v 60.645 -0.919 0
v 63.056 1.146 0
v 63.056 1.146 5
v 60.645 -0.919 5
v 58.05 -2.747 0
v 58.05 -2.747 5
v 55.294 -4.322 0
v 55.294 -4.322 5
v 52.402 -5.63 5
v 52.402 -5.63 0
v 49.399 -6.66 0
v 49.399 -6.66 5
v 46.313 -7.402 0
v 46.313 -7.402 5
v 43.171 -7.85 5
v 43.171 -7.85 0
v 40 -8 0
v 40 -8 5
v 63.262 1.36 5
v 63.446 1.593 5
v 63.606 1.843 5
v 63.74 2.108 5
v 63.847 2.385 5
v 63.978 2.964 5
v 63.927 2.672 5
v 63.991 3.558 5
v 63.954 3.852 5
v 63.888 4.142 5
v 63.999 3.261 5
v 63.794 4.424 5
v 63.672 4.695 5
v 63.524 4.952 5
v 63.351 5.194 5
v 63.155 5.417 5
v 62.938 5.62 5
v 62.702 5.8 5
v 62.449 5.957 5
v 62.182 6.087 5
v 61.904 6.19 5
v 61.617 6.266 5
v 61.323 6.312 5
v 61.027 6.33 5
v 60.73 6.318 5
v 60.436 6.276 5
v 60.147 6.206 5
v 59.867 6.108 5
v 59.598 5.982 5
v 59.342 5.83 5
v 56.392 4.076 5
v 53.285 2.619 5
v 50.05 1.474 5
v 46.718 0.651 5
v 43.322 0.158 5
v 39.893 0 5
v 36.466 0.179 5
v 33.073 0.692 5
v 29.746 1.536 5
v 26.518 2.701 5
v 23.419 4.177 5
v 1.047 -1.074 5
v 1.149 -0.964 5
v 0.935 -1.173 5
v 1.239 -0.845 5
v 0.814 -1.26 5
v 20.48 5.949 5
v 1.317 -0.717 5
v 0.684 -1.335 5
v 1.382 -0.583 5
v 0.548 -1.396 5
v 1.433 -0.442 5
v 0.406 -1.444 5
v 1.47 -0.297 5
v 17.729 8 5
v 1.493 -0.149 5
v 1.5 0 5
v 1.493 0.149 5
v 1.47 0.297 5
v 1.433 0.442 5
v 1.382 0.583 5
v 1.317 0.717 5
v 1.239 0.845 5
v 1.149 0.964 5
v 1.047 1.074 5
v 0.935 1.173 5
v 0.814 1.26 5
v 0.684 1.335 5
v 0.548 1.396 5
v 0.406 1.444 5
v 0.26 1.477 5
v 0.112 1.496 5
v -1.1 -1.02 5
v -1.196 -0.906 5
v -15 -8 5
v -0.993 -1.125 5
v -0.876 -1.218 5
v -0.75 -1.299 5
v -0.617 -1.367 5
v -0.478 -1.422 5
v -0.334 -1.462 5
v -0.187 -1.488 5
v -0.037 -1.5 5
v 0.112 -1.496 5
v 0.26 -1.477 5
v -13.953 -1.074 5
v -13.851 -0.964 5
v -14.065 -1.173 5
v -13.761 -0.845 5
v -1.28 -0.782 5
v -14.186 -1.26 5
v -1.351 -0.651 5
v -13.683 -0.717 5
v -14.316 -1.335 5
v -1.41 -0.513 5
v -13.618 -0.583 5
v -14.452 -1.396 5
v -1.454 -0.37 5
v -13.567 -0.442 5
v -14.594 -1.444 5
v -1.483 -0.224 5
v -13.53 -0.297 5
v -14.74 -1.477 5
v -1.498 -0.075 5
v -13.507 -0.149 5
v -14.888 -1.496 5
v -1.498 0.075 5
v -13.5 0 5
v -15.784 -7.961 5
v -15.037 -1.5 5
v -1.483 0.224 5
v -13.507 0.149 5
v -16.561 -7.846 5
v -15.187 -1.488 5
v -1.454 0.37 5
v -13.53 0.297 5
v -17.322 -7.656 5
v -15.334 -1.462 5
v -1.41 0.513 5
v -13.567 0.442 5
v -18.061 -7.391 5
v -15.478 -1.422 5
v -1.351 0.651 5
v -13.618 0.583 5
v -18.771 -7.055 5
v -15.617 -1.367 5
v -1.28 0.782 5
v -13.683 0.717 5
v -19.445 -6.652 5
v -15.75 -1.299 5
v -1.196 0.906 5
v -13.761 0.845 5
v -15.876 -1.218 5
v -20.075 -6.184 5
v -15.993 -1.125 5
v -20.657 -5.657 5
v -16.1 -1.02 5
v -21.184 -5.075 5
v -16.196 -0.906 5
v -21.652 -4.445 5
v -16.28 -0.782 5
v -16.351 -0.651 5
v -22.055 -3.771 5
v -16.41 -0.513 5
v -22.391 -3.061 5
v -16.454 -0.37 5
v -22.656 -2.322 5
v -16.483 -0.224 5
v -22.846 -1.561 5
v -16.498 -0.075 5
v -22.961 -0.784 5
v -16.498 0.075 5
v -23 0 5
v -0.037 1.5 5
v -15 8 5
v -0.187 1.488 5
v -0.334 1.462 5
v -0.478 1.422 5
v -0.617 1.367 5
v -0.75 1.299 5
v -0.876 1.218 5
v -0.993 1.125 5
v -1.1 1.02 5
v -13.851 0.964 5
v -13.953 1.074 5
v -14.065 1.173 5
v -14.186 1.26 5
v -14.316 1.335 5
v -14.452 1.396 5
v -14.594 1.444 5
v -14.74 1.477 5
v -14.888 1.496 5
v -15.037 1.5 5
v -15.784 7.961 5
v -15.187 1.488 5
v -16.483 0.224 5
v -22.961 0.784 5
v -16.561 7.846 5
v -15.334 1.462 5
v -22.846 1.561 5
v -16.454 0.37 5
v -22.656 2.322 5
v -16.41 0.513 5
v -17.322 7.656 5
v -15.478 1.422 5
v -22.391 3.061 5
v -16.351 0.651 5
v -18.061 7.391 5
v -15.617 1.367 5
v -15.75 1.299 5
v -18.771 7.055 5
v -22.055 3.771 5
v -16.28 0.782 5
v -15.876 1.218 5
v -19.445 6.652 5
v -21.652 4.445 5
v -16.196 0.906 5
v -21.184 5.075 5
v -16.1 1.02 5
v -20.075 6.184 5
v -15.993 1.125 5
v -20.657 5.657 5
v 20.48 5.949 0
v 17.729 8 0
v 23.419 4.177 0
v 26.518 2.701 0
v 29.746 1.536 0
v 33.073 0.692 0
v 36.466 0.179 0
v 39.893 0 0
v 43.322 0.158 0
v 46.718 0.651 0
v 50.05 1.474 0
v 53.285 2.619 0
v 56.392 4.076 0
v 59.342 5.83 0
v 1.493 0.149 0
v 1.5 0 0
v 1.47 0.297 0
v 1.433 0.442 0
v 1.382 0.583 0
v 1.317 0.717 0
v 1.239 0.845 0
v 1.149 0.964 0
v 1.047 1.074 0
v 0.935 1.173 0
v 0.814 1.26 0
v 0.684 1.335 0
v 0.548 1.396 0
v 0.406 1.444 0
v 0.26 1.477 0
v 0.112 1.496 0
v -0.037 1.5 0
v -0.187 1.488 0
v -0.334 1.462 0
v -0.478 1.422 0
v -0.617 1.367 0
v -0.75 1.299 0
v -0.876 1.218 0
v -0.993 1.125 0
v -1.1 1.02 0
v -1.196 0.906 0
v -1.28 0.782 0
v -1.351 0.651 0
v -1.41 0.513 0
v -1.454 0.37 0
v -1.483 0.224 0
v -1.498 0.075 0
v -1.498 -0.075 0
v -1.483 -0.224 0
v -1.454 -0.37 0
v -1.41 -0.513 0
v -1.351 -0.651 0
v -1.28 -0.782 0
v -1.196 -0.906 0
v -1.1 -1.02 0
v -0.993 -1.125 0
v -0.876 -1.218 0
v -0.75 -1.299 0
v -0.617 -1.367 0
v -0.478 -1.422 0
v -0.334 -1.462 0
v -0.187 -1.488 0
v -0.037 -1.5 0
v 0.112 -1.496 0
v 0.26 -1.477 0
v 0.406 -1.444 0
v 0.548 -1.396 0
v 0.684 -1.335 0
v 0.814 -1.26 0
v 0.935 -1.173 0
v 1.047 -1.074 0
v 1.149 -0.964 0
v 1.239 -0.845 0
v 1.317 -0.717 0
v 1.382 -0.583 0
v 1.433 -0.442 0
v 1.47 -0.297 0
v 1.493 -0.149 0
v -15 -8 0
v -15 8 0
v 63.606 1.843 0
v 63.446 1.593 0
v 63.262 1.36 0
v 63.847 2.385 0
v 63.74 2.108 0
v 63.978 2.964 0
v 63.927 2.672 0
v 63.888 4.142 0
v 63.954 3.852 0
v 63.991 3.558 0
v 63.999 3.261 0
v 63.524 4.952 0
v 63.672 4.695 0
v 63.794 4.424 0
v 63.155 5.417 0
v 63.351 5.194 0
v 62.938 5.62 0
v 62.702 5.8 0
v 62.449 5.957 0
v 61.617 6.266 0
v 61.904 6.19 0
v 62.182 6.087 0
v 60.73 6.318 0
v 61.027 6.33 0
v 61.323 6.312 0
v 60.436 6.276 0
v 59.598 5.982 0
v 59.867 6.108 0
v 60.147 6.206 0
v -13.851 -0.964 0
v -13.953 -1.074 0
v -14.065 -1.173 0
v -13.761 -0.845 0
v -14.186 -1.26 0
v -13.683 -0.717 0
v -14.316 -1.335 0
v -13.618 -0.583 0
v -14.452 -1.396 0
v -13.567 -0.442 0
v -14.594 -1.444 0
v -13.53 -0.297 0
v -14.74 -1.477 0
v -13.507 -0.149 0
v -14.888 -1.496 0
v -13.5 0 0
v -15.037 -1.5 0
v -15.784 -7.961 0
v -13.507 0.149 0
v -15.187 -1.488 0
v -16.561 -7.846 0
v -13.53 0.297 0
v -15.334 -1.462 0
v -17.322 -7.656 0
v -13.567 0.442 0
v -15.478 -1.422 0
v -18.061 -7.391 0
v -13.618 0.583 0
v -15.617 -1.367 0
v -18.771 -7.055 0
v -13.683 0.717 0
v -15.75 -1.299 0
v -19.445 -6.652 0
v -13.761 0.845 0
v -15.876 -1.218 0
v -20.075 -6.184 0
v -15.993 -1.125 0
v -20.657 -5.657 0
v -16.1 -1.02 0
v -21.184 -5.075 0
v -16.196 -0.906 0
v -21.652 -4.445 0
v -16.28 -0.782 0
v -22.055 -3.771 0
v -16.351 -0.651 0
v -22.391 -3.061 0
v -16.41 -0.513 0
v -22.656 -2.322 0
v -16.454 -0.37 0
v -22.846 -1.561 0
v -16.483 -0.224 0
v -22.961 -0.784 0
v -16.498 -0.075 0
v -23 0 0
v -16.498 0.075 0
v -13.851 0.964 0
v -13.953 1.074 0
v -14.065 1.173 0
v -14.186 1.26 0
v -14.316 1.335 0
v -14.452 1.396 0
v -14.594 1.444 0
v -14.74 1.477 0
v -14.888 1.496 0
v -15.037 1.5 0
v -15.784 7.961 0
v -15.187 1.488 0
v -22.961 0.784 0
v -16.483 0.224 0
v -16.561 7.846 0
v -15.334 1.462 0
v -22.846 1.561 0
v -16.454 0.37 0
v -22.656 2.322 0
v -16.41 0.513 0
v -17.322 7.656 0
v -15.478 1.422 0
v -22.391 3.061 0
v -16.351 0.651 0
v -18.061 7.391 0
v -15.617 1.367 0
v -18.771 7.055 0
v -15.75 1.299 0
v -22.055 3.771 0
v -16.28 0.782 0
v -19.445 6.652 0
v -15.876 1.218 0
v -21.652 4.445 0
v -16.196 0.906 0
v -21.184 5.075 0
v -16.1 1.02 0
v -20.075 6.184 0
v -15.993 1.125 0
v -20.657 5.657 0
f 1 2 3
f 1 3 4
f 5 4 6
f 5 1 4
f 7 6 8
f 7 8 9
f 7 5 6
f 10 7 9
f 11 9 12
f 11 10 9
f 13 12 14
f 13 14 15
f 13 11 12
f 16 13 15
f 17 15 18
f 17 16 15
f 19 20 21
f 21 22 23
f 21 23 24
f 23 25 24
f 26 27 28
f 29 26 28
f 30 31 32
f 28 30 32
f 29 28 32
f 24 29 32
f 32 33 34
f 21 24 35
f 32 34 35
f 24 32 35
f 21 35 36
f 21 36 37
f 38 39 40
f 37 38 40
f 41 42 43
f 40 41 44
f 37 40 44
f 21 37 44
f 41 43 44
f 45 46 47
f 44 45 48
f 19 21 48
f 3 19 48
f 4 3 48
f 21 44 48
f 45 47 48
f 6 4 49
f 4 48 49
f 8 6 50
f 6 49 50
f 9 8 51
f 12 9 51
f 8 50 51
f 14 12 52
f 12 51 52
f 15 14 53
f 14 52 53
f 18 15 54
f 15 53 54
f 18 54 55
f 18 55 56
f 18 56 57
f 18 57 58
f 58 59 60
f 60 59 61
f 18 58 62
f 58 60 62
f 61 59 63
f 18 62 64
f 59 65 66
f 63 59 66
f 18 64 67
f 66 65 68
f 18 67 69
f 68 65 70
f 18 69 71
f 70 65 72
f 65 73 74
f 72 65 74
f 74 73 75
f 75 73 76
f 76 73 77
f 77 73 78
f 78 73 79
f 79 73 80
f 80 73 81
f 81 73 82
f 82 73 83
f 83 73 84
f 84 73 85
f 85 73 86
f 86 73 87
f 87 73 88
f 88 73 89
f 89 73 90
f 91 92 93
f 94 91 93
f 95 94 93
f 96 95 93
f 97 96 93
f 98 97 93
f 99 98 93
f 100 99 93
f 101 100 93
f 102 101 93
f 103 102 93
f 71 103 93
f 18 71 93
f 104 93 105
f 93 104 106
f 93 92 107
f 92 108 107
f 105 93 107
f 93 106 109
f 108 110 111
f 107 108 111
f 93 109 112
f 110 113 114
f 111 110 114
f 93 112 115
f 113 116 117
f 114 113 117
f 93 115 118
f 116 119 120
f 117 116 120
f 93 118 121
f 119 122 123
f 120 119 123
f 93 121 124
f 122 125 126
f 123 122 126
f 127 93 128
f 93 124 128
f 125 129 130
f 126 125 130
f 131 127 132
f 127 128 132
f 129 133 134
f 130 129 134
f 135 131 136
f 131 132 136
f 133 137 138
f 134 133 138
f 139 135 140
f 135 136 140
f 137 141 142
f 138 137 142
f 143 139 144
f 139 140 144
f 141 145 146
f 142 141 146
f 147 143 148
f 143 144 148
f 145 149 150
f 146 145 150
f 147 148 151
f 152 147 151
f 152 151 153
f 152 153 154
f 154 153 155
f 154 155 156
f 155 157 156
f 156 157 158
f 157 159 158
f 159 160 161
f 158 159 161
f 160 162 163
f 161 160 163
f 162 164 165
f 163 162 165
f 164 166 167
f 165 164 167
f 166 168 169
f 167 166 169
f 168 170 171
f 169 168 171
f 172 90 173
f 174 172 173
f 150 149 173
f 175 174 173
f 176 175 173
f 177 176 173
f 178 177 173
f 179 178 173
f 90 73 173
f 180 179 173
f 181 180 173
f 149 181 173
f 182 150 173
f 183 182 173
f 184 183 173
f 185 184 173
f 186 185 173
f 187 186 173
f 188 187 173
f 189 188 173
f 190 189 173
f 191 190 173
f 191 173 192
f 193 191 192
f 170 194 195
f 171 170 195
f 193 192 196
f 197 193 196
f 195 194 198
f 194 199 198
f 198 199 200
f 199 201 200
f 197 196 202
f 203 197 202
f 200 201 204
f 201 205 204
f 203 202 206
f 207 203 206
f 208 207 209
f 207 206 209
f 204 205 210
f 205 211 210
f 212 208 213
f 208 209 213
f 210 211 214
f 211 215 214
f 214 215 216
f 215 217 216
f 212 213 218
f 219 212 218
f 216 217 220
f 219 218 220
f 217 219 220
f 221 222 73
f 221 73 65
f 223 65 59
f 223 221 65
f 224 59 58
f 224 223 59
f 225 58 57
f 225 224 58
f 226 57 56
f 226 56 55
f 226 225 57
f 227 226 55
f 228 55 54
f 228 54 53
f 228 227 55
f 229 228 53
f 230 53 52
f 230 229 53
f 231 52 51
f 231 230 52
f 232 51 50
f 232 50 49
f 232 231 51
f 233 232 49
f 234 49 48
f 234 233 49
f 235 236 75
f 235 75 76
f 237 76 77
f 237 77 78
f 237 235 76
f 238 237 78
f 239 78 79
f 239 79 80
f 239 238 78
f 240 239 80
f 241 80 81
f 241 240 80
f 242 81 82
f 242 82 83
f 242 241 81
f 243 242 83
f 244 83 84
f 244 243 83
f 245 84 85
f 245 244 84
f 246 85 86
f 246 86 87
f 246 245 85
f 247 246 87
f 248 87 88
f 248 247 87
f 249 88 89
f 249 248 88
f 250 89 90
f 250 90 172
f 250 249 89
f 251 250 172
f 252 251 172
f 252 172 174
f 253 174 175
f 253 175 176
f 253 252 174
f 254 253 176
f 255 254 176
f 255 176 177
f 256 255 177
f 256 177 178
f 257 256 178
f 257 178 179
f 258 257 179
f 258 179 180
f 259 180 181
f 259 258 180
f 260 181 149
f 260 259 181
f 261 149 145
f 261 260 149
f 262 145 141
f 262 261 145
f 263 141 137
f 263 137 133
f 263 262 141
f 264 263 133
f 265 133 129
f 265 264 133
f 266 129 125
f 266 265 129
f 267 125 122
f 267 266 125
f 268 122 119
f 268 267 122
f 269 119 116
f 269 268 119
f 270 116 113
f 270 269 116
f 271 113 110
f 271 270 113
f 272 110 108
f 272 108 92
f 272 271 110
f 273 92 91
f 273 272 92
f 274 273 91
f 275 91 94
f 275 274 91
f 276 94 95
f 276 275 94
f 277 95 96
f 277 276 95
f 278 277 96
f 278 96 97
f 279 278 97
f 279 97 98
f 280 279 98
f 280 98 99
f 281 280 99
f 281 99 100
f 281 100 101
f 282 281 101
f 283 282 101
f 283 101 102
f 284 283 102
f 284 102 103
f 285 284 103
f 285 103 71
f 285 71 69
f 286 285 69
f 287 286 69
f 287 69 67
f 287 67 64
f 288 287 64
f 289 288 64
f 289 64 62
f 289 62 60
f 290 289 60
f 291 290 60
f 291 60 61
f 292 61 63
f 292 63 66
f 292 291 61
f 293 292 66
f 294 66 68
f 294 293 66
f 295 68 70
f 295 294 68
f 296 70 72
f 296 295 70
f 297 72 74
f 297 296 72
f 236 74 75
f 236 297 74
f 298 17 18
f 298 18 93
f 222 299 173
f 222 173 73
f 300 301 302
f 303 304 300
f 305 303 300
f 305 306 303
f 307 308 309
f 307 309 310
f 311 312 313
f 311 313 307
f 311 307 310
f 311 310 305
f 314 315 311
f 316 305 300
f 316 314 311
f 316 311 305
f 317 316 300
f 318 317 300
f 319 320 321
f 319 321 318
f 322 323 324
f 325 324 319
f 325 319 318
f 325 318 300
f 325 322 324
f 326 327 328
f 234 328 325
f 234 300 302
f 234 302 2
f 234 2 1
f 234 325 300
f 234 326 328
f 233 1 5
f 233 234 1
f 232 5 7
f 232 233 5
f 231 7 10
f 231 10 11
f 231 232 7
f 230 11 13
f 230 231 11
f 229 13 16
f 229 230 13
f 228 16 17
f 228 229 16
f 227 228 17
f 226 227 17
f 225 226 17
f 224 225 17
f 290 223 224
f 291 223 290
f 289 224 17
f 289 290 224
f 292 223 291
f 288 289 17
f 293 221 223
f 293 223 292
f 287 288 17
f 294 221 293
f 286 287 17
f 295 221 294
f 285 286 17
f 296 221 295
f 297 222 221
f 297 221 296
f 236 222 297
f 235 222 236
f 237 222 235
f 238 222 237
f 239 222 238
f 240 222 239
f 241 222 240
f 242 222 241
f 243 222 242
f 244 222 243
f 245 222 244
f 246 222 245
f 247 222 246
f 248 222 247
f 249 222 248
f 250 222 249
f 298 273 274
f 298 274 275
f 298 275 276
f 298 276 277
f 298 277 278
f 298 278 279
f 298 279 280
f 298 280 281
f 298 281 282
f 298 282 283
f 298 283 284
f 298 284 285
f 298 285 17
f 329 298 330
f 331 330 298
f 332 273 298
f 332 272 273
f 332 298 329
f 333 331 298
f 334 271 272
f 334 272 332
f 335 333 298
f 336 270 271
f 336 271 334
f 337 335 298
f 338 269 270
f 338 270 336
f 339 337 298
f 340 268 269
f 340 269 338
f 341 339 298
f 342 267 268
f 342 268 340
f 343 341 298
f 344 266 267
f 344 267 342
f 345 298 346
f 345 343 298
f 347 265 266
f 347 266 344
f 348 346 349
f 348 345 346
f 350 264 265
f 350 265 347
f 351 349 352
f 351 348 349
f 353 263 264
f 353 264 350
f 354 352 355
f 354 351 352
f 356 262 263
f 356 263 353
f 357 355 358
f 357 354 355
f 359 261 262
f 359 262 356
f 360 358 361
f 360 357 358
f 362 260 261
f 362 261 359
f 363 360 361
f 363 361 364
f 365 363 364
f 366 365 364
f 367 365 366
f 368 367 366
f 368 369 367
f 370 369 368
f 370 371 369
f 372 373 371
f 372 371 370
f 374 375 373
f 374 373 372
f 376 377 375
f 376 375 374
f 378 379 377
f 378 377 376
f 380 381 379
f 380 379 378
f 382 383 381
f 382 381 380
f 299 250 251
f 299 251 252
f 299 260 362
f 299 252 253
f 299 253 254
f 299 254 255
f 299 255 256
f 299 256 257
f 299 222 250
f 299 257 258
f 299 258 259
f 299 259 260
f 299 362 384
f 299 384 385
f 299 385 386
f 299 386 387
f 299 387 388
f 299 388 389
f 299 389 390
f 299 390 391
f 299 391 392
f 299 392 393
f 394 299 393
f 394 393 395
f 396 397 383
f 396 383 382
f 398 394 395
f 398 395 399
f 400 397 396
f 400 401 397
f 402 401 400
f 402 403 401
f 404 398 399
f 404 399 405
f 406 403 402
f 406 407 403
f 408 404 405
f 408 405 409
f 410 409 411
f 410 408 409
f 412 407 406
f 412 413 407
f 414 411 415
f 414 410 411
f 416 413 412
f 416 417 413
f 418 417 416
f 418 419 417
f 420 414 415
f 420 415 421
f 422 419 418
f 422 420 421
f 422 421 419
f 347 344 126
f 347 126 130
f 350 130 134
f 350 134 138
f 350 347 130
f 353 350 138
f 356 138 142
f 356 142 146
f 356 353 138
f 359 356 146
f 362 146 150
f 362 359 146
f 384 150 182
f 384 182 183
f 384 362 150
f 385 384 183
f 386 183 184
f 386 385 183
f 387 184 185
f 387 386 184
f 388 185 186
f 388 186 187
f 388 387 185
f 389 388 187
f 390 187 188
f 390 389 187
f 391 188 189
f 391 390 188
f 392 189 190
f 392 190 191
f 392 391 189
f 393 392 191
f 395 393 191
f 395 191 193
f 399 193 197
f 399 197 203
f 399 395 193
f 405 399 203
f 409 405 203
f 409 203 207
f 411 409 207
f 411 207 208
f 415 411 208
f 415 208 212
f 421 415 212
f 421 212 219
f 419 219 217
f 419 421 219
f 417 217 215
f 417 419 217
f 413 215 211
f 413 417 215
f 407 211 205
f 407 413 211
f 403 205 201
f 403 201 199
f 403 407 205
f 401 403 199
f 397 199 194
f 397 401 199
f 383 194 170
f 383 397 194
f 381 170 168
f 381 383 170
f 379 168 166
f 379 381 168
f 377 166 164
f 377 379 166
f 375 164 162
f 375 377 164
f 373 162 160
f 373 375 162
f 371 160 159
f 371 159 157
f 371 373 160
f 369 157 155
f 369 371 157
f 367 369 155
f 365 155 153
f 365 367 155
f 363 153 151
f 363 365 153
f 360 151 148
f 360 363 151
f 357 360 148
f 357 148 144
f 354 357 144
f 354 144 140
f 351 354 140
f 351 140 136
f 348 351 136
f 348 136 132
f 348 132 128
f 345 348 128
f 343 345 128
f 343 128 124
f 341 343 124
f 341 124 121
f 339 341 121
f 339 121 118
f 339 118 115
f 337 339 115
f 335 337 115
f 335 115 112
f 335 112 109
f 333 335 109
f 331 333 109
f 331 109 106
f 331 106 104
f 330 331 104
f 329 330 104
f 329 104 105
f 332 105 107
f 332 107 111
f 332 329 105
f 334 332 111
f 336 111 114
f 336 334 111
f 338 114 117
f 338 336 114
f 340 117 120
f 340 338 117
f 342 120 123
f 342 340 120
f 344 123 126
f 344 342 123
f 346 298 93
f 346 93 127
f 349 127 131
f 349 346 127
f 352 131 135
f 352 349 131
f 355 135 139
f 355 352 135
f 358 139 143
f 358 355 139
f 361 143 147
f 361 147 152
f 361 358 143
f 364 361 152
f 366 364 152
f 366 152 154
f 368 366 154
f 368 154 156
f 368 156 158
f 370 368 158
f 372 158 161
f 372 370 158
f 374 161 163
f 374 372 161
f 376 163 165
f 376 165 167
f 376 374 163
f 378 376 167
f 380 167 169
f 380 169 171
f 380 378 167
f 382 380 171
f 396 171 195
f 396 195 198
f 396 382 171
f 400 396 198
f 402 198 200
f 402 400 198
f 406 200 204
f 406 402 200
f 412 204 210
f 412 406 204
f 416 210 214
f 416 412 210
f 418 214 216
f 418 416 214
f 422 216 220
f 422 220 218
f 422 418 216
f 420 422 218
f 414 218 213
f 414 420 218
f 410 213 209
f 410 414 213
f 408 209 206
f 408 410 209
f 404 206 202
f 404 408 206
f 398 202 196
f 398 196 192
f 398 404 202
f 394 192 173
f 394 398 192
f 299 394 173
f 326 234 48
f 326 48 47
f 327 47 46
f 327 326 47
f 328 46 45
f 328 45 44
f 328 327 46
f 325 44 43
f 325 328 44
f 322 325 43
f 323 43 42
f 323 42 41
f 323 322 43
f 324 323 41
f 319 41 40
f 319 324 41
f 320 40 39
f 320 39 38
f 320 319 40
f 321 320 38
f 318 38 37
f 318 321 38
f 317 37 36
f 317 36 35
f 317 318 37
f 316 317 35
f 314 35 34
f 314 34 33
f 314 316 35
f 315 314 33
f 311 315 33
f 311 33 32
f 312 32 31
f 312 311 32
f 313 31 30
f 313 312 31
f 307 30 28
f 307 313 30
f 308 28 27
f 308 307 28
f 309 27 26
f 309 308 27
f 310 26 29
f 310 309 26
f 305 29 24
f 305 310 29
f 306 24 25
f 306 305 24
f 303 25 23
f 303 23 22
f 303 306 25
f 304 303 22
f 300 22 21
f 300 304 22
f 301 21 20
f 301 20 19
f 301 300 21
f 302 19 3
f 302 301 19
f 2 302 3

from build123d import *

# Parameters (mm, degrees)
ESQUISSE1_R        = 1.5
BOSS_EXTRU_1_DEPTH = 5


with BuildPart() as part:
    # Esquisse1 → Boss.-Extru.1 (new body)
    with BuildSketch(Plane.XY):
        with BuildLine():
            Line((0, 8), (17.728942549, 8))
            ThreePointArc((17.728942549, 8), (38.177418085, 0.047486569), (59.342105263, 5.830101749))
            ThreePointArc((59.342105263, 5.830101749), (63.350754016, 5.193679781), (63.05640037, 1.145513075))
            ThreePointArc((63.05640037, 1.145513075), (52.401995882, -5.630136101), (40, -8))
            Line((40, -8), (0, -8))
            Line((0, -8), (-15, -8))
            ThreePointArc((-15, -8), (-23, 0), (-15, 8))
            Line((-15, 8), (0, 8))
        make_face()
        Circle(ESQUISSE1_R, mode=Mode.SUBTRACT)
        with Locations((-15, 0)):
            Circle(ESQUISSE1_R, mode=Mode.SUBTRACT)
    extrude(amount=BOSS_EXTRU_1_DEPTH)


solid = part.part
